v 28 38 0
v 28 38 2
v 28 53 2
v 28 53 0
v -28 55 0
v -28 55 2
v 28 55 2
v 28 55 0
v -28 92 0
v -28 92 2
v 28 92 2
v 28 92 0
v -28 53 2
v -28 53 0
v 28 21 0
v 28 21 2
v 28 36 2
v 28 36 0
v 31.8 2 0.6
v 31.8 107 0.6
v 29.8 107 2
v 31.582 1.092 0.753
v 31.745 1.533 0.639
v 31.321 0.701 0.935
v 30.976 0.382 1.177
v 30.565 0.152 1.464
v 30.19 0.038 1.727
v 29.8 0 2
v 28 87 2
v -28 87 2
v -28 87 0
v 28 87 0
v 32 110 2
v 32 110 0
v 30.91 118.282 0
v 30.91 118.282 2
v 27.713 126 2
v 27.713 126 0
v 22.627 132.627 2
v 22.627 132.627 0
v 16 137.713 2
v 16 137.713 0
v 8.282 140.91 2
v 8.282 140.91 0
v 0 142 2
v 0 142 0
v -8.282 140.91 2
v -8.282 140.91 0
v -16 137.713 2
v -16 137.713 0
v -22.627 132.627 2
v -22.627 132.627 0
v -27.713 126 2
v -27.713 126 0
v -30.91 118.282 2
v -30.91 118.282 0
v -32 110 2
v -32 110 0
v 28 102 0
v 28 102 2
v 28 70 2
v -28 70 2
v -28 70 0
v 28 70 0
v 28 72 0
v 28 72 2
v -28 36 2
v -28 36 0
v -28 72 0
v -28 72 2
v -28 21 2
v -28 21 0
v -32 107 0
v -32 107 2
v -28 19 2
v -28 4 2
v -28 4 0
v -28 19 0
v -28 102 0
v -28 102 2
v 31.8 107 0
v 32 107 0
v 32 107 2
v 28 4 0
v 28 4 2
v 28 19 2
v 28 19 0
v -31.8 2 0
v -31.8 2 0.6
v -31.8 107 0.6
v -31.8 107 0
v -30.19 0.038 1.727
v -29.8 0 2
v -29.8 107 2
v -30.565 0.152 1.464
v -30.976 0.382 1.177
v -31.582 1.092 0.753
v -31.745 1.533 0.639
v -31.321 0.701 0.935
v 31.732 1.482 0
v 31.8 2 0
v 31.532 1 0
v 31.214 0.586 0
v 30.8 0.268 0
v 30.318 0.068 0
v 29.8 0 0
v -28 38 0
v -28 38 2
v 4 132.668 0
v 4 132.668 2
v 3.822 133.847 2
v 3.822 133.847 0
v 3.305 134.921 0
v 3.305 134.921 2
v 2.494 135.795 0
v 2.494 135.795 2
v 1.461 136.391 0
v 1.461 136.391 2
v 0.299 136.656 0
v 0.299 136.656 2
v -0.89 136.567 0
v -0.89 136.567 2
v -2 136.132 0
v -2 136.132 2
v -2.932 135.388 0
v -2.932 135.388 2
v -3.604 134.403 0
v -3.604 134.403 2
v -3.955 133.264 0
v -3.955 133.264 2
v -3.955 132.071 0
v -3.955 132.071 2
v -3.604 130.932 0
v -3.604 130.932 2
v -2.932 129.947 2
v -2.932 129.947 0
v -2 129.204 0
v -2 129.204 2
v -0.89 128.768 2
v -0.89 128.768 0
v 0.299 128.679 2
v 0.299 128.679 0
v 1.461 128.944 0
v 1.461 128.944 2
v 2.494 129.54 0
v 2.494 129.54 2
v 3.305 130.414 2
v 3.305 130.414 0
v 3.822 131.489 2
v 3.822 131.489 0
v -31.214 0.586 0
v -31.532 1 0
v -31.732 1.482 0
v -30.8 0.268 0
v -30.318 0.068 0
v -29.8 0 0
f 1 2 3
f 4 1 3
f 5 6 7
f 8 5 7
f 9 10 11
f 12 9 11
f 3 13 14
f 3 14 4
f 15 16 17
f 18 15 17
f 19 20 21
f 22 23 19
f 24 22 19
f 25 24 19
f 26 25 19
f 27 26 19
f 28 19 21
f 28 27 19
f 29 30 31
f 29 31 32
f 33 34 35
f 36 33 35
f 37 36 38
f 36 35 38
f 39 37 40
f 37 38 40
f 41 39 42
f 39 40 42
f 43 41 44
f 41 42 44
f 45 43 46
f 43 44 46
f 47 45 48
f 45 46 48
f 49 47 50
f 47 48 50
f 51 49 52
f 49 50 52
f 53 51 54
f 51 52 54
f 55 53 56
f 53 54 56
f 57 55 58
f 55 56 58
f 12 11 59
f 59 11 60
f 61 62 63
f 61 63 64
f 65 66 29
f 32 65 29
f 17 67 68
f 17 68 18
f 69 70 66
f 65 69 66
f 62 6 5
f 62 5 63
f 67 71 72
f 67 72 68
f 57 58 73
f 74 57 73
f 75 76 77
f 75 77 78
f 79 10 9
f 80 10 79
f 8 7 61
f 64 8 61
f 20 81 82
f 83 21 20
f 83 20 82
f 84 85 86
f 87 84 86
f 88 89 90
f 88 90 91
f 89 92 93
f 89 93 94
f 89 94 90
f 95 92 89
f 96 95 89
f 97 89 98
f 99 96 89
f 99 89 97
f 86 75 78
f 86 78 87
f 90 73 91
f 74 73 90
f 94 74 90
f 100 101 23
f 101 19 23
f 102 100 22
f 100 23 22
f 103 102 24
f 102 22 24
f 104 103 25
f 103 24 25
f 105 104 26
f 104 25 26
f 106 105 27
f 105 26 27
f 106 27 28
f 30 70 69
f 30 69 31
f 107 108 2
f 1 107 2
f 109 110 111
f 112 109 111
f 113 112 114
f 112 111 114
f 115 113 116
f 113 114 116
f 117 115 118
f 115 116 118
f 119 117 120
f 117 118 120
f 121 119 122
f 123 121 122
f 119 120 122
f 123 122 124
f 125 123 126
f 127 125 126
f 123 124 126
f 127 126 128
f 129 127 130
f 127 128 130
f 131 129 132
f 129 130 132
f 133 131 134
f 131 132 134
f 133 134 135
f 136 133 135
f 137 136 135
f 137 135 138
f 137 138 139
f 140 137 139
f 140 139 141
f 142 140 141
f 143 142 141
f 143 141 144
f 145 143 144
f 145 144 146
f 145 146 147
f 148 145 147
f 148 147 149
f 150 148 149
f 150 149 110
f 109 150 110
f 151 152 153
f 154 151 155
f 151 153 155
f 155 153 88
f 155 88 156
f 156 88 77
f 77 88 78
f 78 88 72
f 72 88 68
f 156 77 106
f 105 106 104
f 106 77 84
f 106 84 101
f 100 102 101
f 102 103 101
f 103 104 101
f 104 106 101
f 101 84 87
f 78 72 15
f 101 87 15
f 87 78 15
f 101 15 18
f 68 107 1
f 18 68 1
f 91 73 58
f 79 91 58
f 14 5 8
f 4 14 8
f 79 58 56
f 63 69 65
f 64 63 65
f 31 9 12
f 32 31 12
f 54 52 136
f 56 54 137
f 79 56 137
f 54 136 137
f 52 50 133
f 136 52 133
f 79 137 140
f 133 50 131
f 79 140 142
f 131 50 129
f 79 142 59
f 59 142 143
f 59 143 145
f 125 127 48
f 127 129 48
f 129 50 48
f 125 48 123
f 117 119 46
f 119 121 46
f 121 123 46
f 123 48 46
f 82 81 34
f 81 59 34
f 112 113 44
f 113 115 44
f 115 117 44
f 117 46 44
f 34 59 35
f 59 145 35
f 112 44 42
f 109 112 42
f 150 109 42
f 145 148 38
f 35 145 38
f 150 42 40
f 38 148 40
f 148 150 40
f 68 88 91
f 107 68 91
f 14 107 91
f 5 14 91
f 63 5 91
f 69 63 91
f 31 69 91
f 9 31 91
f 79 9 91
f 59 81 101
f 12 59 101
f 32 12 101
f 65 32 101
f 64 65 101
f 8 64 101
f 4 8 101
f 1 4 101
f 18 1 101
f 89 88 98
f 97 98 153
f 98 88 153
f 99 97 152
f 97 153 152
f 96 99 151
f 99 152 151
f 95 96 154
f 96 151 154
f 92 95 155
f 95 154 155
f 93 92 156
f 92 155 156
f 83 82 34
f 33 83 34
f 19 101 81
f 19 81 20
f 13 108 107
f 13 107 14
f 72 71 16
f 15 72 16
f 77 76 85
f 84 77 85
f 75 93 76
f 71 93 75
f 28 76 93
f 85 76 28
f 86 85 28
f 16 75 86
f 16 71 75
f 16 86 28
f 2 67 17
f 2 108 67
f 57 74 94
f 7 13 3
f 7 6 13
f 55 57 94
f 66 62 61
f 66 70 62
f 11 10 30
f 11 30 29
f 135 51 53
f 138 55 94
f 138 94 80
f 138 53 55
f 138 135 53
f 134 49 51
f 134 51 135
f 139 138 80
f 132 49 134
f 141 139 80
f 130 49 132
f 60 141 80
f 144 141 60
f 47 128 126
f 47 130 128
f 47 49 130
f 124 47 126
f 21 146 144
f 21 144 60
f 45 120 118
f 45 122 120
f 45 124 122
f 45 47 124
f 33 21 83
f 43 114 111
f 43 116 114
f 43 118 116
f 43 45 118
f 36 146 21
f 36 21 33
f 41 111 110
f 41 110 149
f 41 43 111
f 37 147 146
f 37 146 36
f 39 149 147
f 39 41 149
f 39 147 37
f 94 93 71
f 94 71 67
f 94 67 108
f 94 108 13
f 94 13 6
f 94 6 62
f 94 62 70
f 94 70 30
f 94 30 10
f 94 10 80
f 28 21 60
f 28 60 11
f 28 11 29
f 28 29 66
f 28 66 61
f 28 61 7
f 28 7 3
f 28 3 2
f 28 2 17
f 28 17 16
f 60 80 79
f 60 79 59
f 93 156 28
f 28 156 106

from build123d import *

# Parameters (mm, degrees)
PAD_DEPTH       = 2
SKETCH001_R     = 4
SKETCH001_W     = 56
SKETCH001_H     = 15
SKETCH001_H_2   = 10
POCKET_DEPTH    = 2.001
SKETCH002_W     = 70.645367
SKETCH002_H     = 8.666905
POCKET001_DEPTH = 107
FILLET_R        = 2


with BuildPart() as part:
    # Sketch → Pad (new body)
    with BuildSketch(Plane.XY):
        with BuildLine():
            Line((-32, 110), (-32, 0))
            Line((-32, 0), (32, 0))
            Line((32, 0), (32, 110.000041))
            ThreePointArc((32, 110.000041), (-2.1e-05, 142), (-32, 110))
        make_face()
    extrude(amount=PAD_DEPTH)

    # Sketch001 (on DatumPlane) → Pocket (cut, through all)
    with BuildSketch(Plane.XY.offset(2)):
        with Locations((0, 132.667633)):
            Circle(SKETCH001_R)
        with Locations((0, 11.5)):
            Rectangle(SKETCH001_W, SKETCH001_H)
        with Locations((0, 28.5)):
            Rectangle(SKETCH001_W, SKETCH001_H)
        with Locations((0, 45.5)):
            Rectangle(SKETCH001_W, SKETCH001_H)
        with Locations((0, 62.5)):
            Rectangle(SKETCH001_W, SKETCH001_H)
        with Locations((0, 79.5)):
            Rectangle(SKETCH001_W, SKETCH001_H)
        with Locations((0, 97)):
            Rectangle(SKETCH001_W, SKETCH001_H_2)
    extrude(amount=-POCKET_DEPTH, mode=Mode.SUBTRACT)

    # Sketch002 (on DatumPlane) → Pocket001 (cut)
    with BuildSketch(Plane.XZ):
        with Locations((-0.08378, -0.285264)):
            Rectangle(SKETCH002_W, SKETCH002_H)
        Polygon((29.8, 2), (-29.8, 2), (-31.8, 0.6), (-31.8, 0), (31.8, 0), (31.8, 0.6), align=None, mode=Mode.SUBTRACT)
    extrude(amount=-POCKET001_DEPTH, mode=Mode.SUBTRACT)

    # Fillet
    fillet_edges = [part.edges().sort_by_distance(p)[0] for p in [
        (-31.8, 0, 0.3),
        (31.8, 0, 0.3),
    ]]
    fillet(fillet_edges, radius=FILLET_R)


solid = part.part
